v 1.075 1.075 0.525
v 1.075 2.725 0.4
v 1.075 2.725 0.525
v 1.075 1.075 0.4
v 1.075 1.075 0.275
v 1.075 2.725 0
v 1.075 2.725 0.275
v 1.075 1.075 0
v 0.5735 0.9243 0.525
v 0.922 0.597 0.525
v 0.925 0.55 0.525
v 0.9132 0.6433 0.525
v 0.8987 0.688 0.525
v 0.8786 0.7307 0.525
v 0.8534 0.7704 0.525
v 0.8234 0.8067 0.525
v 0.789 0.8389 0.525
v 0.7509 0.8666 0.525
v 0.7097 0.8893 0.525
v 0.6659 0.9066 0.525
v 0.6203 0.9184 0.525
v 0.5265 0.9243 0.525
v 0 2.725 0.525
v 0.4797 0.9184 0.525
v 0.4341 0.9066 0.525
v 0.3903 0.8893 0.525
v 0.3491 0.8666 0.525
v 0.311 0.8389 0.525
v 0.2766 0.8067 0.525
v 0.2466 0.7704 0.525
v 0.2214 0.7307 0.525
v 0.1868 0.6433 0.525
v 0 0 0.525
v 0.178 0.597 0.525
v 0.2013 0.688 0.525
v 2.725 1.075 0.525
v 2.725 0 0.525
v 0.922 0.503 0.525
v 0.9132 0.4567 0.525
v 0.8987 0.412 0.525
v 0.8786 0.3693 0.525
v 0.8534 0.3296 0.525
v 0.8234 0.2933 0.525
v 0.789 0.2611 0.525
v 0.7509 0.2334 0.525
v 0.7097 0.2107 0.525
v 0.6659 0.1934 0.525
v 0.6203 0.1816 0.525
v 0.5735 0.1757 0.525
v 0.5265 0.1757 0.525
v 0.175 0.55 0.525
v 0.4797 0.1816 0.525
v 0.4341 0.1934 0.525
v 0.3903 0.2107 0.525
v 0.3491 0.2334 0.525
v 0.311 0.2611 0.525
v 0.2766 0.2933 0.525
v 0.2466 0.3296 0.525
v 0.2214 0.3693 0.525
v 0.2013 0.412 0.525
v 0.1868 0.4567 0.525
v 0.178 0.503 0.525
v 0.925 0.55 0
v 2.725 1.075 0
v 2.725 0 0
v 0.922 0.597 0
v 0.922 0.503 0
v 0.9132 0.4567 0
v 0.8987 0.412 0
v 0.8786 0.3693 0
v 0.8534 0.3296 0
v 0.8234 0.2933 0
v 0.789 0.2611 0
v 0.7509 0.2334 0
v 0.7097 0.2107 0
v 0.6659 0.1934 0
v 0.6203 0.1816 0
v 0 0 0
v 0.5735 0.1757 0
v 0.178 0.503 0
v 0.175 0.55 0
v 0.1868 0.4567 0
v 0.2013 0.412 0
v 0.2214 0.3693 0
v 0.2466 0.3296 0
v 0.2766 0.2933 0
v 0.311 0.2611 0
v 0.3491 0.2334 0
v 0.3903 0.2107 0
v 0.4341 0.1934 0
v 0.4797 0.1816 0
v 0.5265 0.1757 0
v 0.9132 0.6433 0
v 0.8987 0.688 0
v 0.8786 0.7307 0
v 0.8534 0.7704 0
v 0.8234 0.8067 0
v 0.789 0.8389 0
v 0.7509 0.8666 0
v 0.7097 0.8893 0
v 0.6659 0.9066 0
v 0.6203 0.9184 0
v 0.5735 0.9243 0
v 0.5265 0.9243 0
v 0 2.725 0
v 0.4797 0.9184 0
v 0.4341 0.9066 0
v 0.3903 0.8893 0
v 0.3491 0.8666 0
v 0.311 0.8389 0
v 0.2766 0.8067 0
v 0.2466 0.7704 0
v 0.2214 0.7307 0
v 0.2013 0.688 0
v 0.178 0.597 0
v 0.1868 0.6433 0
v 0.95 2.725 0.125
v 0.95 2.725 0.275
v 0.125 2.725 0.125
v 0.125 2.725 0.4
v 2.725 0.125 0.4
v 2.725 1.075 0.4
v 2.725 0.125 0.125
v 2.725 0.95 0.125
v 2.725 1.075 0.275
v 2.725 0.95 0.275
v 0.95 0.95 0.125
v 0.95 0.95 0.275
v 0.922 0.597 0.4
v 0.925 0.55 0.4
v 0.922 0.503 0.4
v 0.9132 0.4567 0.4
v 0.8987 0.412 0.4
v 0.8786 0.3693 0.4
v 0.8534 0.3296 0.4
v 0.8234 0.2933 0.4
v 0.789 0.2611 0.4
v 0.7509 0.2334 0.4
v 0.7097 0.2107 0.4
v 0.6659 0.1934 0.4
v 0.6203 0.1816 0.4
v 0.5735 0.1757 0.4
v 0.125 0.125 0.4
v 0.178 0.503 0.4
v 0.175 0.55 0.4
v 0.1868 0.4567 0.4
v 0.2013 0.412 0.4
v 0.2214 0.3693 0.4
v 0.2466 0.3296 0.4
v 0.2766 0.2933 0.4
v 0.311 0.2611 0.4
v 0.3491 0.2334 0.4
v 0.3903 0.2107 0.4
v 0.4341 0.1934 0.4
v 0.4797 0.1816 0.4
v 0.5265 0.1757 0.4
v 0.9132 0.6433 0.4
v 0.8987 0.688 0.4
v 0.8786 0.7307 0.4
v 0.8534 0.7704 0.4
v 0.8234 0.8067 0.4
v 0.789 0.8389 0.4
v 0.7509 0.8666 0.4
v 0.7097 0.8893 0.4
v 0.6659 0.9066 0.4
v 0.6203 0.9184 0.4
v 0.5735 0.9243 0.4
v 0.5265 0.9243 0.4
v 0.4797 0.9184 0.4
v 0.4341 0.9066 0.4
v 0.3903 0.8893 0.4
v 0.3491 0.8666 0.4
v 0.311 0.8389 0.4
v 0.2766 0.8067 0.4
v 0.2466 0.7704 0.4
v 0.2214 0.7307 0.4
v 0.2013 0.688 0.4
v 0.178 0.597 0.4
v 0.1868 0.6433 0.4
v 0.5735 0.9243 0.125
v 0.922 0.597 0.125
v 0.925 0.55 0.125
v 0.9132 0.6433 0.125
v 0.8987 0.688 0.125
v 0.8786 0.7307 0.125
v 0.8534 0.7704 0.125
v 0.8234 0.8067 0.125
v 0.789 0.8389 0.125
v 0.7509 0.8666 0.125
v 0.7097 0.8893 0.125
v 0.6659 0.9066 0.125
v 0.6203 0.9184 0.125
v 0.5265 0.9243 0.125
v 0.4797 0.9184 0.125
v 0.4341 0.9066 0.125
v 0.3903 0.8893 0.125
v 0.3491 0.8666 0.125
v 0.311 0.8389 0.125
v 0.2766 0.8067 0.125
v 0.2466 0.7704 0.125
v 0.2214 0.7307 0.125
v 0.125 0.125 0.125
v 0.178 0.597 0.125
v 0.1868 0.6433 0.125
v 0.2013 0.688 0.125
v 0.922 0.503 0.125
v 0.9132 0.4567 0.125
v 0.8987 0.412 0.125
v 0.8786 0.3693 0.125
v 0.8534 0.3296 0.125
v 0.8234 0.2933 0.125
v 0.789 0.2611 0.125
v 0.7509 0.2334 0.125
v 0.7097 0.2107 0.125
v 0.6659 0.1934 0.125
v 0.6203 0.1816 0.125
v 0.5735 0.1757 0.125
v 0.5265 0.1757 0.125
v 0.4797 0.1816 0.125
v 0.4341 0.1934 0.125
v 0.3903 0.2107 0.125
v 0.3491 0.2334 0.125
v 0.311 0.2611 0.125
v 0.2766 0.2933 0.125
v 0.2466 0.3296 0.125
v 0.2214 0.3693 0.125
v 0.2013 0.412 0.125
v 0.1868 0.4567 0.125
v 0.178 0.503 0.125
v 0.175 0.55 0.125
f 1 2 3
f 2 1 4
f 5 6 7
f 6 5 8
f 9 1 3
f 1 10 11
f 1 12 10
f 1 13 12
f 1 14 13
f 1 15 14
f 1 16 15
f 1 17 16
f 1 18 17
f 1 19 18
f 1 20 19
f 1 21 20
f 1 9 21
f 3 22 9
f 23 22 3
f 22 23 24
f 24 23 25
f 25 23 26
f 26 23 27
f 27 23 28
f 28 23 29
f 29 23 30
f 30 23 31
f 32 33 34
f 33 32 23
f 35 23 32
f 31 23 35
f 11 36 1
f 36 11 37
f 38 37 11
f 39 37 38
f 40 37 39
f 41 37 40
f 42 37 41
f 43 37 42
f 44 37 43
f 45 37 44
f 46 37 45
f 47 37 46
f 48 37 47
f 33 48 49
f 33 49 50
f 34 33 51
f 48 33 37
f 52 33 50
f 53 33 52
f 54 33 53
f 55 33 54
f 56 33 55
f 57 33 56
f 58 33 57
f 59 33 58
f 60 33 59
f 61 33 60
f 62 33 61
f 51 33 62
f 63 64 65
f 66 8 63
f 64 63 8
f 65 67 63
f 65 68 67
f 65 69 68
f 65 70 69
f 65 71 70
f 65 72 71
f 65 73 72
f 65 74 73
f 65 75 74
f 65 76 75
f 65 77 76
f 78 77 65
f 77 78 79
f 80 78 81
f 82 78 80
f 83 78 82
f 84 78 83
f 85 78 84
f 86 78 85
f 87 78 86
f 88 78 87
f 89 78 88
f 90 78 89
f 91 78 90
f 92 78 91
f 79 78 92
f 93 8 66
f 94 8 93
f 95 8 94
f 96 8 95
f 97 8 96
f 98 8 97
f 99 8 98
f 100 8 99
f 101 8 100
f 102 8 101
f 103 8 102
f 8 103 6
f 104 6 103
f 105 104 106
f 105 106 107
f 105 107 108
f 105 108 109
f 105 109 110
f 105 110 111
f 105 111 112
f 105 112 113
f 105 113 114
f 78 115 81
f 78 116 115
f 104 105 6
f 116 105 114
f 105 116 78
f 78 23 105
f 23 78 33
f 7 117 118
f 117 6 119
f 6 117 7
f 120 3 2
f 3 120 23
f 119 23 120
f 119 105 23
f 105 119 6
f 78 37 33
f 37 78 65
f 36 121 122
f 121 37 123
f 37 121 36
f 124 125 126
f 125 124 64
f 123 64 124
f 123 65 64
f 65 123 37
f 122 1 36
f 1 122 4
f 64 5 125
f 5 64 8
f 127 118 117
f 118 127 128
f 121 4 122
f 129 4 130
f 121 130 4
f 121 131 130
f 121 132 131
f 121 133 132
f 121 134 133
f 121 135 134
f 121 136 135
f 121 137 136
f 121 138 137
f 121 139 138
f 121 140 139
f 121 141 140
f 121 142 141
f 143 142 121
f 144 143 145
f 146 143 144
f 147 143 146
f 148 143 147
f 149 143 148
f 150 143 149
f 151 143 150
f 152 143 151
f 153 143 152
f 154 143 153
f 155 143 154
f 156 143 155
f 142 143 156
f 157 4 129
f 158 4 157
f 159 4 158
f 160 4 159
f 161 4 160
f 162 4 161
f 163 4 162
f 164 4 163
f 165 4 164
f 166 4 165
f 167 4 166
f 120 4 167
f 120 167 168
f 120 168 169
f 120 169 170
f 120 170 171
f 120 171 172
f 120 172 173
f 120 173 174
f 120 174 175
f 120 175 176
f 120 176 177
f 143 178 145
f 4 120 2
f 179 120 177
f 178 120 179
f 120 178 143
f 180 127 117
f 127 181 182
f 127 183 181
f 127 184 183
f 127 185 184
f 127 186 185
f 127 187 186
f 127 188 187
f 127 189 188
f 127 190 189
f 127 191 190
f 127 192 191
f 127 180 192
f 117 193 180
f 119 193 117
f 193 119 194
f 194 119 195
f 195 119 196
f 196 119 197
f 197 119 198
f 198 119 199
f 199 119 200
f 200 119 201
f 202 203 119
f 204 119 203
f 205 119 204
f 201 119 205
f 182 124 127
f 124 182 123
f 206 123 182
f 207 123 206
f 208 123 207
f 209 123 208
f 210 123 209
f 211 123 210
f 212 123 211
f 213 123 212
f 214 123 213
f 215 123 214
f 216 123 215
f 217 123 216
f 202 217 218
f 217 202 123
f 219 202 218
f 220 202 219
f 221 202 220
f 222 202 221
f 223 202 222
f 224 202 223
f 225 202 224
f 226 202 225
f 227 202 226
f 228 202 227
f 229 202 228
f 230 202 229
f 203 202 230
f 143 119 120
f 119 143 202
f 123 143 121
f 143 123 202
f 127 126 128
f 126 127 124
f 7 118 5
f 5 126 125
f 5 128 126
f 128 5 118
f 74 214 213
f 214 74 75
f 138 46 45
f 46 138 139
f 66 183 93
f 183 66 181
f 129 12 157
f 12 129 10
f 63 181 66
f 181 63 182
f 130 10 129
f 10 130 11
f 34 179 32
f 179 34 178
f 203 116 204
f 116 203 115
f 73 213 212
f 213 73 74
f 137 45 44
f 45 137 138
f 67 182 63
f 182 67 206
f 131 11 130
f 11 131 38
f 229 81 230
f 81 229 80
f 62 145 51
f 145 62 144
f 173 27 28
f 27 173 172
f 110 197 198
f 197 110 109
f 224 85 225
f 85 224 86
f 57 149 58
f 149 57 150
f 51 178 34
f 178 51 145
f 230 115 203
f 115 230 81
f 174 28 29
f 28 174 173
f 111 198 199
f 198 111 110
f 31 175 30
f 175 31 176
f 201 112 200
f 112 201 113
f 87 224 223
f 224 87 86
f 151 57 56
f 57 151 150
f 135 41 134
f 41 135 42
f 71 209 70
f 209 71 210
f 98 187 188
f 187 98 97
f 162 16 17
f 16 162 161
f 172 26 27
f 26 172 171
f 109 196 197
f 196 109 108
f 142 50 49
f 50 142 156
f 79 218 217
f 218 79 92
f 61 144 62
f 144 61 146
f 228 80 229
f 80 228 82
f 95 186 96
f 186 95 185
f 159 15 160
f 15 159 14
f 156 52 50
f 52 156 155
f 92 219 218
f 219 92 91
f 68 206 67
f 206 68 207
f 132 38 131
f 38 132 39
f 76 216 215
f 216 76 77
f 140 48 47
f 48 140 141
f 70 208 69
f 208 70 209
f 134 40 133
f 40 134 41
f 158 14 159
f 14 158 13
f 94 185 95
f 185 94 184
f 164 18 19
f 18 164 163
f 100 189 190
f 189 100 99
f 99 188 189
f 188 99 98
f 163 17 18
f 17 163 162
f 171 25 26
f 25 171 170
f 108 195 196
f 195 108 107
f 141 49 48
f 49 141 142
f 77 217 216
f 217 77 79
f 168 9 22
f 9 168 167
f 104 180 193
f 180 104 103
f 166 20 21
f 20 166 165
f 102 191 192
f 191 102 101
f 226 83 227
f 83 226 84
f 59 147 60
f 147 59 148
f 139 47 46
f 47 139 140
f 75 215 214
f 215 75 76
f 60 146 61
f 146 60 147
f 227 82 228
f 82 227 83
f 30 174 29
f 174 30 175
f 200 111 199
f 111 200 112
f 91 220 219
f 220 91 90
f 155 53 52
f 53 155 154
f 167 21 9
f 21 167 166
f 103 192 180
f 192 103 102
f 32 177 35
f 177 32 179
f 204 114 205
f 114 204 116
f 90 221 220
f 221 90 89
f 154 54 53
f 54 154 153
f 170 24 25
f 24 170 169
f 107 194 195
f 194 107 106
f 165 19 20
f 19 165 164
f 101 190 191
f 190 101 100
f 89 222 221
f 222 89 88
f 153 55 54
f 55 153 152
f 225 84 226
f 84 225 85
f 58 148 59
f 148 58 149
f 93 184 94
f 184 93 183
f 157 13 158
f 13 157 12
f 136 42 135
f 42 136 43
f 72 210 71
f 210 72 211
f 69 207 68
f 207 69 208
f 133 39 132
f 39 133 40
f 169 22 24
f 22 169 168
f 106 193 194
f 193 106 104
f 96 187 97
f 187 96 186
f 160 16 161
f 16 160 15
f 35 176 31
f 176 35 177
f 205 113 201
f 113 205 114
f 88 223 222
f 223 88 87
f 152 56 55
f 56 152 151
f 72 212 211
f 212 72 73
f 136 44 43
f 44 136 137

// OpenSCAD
// Window screen corners

tolerance = 1.10;
frameWidth = 0.75 * tolerance;
frameDepth = 0.25 * tolerance;
thickness = 0.125;
//multiplier = 25.4;
multiplier = 1;

ScreenCorner(
    frameWidth * multiplier,
    frameDepth * multiplier,
    thickness * multiplier,
    frameWidth * multiplier * 3
);

module ScreenCorner(frameWidth=3, frameDepth=1, thickness=1, socketLength=9, $fn=false) {
    center = $fn;

    totalDepth = 2 * thickness + frameDepth;
    totalWidth = 2 * thickness + frameWidth;
    totalHeight = 2 * thickness + socketLength;
    radius = thickness * 3;
    holeOffset = frameDepth * 2;

    difference() {
        union() {
            cube([totalWidth, totalHeight, totalDepth], center);
            cube([totalHeight, totalWidth, totalDepth], center);
        }
     
        translate([thickness, thickness, thickness]) {
            cube([frameWidth, totalHeight, frameDepth], center);    
        }
        translate([thickness, thickness, thickness]) {
            cube([totalHeight, frameWidth, frameDepth], center);
        }
        translate([thickness, thickness, totalDepth - 2*thickness]) {
            cube([totalHeight, totalHeight, thickness], center); 
        }
        translate([holeOffset, holeOffset, 0]) {
            cylinder(totalDepth, radius, radius, center, $fn=50);
        }
    }
       
}
